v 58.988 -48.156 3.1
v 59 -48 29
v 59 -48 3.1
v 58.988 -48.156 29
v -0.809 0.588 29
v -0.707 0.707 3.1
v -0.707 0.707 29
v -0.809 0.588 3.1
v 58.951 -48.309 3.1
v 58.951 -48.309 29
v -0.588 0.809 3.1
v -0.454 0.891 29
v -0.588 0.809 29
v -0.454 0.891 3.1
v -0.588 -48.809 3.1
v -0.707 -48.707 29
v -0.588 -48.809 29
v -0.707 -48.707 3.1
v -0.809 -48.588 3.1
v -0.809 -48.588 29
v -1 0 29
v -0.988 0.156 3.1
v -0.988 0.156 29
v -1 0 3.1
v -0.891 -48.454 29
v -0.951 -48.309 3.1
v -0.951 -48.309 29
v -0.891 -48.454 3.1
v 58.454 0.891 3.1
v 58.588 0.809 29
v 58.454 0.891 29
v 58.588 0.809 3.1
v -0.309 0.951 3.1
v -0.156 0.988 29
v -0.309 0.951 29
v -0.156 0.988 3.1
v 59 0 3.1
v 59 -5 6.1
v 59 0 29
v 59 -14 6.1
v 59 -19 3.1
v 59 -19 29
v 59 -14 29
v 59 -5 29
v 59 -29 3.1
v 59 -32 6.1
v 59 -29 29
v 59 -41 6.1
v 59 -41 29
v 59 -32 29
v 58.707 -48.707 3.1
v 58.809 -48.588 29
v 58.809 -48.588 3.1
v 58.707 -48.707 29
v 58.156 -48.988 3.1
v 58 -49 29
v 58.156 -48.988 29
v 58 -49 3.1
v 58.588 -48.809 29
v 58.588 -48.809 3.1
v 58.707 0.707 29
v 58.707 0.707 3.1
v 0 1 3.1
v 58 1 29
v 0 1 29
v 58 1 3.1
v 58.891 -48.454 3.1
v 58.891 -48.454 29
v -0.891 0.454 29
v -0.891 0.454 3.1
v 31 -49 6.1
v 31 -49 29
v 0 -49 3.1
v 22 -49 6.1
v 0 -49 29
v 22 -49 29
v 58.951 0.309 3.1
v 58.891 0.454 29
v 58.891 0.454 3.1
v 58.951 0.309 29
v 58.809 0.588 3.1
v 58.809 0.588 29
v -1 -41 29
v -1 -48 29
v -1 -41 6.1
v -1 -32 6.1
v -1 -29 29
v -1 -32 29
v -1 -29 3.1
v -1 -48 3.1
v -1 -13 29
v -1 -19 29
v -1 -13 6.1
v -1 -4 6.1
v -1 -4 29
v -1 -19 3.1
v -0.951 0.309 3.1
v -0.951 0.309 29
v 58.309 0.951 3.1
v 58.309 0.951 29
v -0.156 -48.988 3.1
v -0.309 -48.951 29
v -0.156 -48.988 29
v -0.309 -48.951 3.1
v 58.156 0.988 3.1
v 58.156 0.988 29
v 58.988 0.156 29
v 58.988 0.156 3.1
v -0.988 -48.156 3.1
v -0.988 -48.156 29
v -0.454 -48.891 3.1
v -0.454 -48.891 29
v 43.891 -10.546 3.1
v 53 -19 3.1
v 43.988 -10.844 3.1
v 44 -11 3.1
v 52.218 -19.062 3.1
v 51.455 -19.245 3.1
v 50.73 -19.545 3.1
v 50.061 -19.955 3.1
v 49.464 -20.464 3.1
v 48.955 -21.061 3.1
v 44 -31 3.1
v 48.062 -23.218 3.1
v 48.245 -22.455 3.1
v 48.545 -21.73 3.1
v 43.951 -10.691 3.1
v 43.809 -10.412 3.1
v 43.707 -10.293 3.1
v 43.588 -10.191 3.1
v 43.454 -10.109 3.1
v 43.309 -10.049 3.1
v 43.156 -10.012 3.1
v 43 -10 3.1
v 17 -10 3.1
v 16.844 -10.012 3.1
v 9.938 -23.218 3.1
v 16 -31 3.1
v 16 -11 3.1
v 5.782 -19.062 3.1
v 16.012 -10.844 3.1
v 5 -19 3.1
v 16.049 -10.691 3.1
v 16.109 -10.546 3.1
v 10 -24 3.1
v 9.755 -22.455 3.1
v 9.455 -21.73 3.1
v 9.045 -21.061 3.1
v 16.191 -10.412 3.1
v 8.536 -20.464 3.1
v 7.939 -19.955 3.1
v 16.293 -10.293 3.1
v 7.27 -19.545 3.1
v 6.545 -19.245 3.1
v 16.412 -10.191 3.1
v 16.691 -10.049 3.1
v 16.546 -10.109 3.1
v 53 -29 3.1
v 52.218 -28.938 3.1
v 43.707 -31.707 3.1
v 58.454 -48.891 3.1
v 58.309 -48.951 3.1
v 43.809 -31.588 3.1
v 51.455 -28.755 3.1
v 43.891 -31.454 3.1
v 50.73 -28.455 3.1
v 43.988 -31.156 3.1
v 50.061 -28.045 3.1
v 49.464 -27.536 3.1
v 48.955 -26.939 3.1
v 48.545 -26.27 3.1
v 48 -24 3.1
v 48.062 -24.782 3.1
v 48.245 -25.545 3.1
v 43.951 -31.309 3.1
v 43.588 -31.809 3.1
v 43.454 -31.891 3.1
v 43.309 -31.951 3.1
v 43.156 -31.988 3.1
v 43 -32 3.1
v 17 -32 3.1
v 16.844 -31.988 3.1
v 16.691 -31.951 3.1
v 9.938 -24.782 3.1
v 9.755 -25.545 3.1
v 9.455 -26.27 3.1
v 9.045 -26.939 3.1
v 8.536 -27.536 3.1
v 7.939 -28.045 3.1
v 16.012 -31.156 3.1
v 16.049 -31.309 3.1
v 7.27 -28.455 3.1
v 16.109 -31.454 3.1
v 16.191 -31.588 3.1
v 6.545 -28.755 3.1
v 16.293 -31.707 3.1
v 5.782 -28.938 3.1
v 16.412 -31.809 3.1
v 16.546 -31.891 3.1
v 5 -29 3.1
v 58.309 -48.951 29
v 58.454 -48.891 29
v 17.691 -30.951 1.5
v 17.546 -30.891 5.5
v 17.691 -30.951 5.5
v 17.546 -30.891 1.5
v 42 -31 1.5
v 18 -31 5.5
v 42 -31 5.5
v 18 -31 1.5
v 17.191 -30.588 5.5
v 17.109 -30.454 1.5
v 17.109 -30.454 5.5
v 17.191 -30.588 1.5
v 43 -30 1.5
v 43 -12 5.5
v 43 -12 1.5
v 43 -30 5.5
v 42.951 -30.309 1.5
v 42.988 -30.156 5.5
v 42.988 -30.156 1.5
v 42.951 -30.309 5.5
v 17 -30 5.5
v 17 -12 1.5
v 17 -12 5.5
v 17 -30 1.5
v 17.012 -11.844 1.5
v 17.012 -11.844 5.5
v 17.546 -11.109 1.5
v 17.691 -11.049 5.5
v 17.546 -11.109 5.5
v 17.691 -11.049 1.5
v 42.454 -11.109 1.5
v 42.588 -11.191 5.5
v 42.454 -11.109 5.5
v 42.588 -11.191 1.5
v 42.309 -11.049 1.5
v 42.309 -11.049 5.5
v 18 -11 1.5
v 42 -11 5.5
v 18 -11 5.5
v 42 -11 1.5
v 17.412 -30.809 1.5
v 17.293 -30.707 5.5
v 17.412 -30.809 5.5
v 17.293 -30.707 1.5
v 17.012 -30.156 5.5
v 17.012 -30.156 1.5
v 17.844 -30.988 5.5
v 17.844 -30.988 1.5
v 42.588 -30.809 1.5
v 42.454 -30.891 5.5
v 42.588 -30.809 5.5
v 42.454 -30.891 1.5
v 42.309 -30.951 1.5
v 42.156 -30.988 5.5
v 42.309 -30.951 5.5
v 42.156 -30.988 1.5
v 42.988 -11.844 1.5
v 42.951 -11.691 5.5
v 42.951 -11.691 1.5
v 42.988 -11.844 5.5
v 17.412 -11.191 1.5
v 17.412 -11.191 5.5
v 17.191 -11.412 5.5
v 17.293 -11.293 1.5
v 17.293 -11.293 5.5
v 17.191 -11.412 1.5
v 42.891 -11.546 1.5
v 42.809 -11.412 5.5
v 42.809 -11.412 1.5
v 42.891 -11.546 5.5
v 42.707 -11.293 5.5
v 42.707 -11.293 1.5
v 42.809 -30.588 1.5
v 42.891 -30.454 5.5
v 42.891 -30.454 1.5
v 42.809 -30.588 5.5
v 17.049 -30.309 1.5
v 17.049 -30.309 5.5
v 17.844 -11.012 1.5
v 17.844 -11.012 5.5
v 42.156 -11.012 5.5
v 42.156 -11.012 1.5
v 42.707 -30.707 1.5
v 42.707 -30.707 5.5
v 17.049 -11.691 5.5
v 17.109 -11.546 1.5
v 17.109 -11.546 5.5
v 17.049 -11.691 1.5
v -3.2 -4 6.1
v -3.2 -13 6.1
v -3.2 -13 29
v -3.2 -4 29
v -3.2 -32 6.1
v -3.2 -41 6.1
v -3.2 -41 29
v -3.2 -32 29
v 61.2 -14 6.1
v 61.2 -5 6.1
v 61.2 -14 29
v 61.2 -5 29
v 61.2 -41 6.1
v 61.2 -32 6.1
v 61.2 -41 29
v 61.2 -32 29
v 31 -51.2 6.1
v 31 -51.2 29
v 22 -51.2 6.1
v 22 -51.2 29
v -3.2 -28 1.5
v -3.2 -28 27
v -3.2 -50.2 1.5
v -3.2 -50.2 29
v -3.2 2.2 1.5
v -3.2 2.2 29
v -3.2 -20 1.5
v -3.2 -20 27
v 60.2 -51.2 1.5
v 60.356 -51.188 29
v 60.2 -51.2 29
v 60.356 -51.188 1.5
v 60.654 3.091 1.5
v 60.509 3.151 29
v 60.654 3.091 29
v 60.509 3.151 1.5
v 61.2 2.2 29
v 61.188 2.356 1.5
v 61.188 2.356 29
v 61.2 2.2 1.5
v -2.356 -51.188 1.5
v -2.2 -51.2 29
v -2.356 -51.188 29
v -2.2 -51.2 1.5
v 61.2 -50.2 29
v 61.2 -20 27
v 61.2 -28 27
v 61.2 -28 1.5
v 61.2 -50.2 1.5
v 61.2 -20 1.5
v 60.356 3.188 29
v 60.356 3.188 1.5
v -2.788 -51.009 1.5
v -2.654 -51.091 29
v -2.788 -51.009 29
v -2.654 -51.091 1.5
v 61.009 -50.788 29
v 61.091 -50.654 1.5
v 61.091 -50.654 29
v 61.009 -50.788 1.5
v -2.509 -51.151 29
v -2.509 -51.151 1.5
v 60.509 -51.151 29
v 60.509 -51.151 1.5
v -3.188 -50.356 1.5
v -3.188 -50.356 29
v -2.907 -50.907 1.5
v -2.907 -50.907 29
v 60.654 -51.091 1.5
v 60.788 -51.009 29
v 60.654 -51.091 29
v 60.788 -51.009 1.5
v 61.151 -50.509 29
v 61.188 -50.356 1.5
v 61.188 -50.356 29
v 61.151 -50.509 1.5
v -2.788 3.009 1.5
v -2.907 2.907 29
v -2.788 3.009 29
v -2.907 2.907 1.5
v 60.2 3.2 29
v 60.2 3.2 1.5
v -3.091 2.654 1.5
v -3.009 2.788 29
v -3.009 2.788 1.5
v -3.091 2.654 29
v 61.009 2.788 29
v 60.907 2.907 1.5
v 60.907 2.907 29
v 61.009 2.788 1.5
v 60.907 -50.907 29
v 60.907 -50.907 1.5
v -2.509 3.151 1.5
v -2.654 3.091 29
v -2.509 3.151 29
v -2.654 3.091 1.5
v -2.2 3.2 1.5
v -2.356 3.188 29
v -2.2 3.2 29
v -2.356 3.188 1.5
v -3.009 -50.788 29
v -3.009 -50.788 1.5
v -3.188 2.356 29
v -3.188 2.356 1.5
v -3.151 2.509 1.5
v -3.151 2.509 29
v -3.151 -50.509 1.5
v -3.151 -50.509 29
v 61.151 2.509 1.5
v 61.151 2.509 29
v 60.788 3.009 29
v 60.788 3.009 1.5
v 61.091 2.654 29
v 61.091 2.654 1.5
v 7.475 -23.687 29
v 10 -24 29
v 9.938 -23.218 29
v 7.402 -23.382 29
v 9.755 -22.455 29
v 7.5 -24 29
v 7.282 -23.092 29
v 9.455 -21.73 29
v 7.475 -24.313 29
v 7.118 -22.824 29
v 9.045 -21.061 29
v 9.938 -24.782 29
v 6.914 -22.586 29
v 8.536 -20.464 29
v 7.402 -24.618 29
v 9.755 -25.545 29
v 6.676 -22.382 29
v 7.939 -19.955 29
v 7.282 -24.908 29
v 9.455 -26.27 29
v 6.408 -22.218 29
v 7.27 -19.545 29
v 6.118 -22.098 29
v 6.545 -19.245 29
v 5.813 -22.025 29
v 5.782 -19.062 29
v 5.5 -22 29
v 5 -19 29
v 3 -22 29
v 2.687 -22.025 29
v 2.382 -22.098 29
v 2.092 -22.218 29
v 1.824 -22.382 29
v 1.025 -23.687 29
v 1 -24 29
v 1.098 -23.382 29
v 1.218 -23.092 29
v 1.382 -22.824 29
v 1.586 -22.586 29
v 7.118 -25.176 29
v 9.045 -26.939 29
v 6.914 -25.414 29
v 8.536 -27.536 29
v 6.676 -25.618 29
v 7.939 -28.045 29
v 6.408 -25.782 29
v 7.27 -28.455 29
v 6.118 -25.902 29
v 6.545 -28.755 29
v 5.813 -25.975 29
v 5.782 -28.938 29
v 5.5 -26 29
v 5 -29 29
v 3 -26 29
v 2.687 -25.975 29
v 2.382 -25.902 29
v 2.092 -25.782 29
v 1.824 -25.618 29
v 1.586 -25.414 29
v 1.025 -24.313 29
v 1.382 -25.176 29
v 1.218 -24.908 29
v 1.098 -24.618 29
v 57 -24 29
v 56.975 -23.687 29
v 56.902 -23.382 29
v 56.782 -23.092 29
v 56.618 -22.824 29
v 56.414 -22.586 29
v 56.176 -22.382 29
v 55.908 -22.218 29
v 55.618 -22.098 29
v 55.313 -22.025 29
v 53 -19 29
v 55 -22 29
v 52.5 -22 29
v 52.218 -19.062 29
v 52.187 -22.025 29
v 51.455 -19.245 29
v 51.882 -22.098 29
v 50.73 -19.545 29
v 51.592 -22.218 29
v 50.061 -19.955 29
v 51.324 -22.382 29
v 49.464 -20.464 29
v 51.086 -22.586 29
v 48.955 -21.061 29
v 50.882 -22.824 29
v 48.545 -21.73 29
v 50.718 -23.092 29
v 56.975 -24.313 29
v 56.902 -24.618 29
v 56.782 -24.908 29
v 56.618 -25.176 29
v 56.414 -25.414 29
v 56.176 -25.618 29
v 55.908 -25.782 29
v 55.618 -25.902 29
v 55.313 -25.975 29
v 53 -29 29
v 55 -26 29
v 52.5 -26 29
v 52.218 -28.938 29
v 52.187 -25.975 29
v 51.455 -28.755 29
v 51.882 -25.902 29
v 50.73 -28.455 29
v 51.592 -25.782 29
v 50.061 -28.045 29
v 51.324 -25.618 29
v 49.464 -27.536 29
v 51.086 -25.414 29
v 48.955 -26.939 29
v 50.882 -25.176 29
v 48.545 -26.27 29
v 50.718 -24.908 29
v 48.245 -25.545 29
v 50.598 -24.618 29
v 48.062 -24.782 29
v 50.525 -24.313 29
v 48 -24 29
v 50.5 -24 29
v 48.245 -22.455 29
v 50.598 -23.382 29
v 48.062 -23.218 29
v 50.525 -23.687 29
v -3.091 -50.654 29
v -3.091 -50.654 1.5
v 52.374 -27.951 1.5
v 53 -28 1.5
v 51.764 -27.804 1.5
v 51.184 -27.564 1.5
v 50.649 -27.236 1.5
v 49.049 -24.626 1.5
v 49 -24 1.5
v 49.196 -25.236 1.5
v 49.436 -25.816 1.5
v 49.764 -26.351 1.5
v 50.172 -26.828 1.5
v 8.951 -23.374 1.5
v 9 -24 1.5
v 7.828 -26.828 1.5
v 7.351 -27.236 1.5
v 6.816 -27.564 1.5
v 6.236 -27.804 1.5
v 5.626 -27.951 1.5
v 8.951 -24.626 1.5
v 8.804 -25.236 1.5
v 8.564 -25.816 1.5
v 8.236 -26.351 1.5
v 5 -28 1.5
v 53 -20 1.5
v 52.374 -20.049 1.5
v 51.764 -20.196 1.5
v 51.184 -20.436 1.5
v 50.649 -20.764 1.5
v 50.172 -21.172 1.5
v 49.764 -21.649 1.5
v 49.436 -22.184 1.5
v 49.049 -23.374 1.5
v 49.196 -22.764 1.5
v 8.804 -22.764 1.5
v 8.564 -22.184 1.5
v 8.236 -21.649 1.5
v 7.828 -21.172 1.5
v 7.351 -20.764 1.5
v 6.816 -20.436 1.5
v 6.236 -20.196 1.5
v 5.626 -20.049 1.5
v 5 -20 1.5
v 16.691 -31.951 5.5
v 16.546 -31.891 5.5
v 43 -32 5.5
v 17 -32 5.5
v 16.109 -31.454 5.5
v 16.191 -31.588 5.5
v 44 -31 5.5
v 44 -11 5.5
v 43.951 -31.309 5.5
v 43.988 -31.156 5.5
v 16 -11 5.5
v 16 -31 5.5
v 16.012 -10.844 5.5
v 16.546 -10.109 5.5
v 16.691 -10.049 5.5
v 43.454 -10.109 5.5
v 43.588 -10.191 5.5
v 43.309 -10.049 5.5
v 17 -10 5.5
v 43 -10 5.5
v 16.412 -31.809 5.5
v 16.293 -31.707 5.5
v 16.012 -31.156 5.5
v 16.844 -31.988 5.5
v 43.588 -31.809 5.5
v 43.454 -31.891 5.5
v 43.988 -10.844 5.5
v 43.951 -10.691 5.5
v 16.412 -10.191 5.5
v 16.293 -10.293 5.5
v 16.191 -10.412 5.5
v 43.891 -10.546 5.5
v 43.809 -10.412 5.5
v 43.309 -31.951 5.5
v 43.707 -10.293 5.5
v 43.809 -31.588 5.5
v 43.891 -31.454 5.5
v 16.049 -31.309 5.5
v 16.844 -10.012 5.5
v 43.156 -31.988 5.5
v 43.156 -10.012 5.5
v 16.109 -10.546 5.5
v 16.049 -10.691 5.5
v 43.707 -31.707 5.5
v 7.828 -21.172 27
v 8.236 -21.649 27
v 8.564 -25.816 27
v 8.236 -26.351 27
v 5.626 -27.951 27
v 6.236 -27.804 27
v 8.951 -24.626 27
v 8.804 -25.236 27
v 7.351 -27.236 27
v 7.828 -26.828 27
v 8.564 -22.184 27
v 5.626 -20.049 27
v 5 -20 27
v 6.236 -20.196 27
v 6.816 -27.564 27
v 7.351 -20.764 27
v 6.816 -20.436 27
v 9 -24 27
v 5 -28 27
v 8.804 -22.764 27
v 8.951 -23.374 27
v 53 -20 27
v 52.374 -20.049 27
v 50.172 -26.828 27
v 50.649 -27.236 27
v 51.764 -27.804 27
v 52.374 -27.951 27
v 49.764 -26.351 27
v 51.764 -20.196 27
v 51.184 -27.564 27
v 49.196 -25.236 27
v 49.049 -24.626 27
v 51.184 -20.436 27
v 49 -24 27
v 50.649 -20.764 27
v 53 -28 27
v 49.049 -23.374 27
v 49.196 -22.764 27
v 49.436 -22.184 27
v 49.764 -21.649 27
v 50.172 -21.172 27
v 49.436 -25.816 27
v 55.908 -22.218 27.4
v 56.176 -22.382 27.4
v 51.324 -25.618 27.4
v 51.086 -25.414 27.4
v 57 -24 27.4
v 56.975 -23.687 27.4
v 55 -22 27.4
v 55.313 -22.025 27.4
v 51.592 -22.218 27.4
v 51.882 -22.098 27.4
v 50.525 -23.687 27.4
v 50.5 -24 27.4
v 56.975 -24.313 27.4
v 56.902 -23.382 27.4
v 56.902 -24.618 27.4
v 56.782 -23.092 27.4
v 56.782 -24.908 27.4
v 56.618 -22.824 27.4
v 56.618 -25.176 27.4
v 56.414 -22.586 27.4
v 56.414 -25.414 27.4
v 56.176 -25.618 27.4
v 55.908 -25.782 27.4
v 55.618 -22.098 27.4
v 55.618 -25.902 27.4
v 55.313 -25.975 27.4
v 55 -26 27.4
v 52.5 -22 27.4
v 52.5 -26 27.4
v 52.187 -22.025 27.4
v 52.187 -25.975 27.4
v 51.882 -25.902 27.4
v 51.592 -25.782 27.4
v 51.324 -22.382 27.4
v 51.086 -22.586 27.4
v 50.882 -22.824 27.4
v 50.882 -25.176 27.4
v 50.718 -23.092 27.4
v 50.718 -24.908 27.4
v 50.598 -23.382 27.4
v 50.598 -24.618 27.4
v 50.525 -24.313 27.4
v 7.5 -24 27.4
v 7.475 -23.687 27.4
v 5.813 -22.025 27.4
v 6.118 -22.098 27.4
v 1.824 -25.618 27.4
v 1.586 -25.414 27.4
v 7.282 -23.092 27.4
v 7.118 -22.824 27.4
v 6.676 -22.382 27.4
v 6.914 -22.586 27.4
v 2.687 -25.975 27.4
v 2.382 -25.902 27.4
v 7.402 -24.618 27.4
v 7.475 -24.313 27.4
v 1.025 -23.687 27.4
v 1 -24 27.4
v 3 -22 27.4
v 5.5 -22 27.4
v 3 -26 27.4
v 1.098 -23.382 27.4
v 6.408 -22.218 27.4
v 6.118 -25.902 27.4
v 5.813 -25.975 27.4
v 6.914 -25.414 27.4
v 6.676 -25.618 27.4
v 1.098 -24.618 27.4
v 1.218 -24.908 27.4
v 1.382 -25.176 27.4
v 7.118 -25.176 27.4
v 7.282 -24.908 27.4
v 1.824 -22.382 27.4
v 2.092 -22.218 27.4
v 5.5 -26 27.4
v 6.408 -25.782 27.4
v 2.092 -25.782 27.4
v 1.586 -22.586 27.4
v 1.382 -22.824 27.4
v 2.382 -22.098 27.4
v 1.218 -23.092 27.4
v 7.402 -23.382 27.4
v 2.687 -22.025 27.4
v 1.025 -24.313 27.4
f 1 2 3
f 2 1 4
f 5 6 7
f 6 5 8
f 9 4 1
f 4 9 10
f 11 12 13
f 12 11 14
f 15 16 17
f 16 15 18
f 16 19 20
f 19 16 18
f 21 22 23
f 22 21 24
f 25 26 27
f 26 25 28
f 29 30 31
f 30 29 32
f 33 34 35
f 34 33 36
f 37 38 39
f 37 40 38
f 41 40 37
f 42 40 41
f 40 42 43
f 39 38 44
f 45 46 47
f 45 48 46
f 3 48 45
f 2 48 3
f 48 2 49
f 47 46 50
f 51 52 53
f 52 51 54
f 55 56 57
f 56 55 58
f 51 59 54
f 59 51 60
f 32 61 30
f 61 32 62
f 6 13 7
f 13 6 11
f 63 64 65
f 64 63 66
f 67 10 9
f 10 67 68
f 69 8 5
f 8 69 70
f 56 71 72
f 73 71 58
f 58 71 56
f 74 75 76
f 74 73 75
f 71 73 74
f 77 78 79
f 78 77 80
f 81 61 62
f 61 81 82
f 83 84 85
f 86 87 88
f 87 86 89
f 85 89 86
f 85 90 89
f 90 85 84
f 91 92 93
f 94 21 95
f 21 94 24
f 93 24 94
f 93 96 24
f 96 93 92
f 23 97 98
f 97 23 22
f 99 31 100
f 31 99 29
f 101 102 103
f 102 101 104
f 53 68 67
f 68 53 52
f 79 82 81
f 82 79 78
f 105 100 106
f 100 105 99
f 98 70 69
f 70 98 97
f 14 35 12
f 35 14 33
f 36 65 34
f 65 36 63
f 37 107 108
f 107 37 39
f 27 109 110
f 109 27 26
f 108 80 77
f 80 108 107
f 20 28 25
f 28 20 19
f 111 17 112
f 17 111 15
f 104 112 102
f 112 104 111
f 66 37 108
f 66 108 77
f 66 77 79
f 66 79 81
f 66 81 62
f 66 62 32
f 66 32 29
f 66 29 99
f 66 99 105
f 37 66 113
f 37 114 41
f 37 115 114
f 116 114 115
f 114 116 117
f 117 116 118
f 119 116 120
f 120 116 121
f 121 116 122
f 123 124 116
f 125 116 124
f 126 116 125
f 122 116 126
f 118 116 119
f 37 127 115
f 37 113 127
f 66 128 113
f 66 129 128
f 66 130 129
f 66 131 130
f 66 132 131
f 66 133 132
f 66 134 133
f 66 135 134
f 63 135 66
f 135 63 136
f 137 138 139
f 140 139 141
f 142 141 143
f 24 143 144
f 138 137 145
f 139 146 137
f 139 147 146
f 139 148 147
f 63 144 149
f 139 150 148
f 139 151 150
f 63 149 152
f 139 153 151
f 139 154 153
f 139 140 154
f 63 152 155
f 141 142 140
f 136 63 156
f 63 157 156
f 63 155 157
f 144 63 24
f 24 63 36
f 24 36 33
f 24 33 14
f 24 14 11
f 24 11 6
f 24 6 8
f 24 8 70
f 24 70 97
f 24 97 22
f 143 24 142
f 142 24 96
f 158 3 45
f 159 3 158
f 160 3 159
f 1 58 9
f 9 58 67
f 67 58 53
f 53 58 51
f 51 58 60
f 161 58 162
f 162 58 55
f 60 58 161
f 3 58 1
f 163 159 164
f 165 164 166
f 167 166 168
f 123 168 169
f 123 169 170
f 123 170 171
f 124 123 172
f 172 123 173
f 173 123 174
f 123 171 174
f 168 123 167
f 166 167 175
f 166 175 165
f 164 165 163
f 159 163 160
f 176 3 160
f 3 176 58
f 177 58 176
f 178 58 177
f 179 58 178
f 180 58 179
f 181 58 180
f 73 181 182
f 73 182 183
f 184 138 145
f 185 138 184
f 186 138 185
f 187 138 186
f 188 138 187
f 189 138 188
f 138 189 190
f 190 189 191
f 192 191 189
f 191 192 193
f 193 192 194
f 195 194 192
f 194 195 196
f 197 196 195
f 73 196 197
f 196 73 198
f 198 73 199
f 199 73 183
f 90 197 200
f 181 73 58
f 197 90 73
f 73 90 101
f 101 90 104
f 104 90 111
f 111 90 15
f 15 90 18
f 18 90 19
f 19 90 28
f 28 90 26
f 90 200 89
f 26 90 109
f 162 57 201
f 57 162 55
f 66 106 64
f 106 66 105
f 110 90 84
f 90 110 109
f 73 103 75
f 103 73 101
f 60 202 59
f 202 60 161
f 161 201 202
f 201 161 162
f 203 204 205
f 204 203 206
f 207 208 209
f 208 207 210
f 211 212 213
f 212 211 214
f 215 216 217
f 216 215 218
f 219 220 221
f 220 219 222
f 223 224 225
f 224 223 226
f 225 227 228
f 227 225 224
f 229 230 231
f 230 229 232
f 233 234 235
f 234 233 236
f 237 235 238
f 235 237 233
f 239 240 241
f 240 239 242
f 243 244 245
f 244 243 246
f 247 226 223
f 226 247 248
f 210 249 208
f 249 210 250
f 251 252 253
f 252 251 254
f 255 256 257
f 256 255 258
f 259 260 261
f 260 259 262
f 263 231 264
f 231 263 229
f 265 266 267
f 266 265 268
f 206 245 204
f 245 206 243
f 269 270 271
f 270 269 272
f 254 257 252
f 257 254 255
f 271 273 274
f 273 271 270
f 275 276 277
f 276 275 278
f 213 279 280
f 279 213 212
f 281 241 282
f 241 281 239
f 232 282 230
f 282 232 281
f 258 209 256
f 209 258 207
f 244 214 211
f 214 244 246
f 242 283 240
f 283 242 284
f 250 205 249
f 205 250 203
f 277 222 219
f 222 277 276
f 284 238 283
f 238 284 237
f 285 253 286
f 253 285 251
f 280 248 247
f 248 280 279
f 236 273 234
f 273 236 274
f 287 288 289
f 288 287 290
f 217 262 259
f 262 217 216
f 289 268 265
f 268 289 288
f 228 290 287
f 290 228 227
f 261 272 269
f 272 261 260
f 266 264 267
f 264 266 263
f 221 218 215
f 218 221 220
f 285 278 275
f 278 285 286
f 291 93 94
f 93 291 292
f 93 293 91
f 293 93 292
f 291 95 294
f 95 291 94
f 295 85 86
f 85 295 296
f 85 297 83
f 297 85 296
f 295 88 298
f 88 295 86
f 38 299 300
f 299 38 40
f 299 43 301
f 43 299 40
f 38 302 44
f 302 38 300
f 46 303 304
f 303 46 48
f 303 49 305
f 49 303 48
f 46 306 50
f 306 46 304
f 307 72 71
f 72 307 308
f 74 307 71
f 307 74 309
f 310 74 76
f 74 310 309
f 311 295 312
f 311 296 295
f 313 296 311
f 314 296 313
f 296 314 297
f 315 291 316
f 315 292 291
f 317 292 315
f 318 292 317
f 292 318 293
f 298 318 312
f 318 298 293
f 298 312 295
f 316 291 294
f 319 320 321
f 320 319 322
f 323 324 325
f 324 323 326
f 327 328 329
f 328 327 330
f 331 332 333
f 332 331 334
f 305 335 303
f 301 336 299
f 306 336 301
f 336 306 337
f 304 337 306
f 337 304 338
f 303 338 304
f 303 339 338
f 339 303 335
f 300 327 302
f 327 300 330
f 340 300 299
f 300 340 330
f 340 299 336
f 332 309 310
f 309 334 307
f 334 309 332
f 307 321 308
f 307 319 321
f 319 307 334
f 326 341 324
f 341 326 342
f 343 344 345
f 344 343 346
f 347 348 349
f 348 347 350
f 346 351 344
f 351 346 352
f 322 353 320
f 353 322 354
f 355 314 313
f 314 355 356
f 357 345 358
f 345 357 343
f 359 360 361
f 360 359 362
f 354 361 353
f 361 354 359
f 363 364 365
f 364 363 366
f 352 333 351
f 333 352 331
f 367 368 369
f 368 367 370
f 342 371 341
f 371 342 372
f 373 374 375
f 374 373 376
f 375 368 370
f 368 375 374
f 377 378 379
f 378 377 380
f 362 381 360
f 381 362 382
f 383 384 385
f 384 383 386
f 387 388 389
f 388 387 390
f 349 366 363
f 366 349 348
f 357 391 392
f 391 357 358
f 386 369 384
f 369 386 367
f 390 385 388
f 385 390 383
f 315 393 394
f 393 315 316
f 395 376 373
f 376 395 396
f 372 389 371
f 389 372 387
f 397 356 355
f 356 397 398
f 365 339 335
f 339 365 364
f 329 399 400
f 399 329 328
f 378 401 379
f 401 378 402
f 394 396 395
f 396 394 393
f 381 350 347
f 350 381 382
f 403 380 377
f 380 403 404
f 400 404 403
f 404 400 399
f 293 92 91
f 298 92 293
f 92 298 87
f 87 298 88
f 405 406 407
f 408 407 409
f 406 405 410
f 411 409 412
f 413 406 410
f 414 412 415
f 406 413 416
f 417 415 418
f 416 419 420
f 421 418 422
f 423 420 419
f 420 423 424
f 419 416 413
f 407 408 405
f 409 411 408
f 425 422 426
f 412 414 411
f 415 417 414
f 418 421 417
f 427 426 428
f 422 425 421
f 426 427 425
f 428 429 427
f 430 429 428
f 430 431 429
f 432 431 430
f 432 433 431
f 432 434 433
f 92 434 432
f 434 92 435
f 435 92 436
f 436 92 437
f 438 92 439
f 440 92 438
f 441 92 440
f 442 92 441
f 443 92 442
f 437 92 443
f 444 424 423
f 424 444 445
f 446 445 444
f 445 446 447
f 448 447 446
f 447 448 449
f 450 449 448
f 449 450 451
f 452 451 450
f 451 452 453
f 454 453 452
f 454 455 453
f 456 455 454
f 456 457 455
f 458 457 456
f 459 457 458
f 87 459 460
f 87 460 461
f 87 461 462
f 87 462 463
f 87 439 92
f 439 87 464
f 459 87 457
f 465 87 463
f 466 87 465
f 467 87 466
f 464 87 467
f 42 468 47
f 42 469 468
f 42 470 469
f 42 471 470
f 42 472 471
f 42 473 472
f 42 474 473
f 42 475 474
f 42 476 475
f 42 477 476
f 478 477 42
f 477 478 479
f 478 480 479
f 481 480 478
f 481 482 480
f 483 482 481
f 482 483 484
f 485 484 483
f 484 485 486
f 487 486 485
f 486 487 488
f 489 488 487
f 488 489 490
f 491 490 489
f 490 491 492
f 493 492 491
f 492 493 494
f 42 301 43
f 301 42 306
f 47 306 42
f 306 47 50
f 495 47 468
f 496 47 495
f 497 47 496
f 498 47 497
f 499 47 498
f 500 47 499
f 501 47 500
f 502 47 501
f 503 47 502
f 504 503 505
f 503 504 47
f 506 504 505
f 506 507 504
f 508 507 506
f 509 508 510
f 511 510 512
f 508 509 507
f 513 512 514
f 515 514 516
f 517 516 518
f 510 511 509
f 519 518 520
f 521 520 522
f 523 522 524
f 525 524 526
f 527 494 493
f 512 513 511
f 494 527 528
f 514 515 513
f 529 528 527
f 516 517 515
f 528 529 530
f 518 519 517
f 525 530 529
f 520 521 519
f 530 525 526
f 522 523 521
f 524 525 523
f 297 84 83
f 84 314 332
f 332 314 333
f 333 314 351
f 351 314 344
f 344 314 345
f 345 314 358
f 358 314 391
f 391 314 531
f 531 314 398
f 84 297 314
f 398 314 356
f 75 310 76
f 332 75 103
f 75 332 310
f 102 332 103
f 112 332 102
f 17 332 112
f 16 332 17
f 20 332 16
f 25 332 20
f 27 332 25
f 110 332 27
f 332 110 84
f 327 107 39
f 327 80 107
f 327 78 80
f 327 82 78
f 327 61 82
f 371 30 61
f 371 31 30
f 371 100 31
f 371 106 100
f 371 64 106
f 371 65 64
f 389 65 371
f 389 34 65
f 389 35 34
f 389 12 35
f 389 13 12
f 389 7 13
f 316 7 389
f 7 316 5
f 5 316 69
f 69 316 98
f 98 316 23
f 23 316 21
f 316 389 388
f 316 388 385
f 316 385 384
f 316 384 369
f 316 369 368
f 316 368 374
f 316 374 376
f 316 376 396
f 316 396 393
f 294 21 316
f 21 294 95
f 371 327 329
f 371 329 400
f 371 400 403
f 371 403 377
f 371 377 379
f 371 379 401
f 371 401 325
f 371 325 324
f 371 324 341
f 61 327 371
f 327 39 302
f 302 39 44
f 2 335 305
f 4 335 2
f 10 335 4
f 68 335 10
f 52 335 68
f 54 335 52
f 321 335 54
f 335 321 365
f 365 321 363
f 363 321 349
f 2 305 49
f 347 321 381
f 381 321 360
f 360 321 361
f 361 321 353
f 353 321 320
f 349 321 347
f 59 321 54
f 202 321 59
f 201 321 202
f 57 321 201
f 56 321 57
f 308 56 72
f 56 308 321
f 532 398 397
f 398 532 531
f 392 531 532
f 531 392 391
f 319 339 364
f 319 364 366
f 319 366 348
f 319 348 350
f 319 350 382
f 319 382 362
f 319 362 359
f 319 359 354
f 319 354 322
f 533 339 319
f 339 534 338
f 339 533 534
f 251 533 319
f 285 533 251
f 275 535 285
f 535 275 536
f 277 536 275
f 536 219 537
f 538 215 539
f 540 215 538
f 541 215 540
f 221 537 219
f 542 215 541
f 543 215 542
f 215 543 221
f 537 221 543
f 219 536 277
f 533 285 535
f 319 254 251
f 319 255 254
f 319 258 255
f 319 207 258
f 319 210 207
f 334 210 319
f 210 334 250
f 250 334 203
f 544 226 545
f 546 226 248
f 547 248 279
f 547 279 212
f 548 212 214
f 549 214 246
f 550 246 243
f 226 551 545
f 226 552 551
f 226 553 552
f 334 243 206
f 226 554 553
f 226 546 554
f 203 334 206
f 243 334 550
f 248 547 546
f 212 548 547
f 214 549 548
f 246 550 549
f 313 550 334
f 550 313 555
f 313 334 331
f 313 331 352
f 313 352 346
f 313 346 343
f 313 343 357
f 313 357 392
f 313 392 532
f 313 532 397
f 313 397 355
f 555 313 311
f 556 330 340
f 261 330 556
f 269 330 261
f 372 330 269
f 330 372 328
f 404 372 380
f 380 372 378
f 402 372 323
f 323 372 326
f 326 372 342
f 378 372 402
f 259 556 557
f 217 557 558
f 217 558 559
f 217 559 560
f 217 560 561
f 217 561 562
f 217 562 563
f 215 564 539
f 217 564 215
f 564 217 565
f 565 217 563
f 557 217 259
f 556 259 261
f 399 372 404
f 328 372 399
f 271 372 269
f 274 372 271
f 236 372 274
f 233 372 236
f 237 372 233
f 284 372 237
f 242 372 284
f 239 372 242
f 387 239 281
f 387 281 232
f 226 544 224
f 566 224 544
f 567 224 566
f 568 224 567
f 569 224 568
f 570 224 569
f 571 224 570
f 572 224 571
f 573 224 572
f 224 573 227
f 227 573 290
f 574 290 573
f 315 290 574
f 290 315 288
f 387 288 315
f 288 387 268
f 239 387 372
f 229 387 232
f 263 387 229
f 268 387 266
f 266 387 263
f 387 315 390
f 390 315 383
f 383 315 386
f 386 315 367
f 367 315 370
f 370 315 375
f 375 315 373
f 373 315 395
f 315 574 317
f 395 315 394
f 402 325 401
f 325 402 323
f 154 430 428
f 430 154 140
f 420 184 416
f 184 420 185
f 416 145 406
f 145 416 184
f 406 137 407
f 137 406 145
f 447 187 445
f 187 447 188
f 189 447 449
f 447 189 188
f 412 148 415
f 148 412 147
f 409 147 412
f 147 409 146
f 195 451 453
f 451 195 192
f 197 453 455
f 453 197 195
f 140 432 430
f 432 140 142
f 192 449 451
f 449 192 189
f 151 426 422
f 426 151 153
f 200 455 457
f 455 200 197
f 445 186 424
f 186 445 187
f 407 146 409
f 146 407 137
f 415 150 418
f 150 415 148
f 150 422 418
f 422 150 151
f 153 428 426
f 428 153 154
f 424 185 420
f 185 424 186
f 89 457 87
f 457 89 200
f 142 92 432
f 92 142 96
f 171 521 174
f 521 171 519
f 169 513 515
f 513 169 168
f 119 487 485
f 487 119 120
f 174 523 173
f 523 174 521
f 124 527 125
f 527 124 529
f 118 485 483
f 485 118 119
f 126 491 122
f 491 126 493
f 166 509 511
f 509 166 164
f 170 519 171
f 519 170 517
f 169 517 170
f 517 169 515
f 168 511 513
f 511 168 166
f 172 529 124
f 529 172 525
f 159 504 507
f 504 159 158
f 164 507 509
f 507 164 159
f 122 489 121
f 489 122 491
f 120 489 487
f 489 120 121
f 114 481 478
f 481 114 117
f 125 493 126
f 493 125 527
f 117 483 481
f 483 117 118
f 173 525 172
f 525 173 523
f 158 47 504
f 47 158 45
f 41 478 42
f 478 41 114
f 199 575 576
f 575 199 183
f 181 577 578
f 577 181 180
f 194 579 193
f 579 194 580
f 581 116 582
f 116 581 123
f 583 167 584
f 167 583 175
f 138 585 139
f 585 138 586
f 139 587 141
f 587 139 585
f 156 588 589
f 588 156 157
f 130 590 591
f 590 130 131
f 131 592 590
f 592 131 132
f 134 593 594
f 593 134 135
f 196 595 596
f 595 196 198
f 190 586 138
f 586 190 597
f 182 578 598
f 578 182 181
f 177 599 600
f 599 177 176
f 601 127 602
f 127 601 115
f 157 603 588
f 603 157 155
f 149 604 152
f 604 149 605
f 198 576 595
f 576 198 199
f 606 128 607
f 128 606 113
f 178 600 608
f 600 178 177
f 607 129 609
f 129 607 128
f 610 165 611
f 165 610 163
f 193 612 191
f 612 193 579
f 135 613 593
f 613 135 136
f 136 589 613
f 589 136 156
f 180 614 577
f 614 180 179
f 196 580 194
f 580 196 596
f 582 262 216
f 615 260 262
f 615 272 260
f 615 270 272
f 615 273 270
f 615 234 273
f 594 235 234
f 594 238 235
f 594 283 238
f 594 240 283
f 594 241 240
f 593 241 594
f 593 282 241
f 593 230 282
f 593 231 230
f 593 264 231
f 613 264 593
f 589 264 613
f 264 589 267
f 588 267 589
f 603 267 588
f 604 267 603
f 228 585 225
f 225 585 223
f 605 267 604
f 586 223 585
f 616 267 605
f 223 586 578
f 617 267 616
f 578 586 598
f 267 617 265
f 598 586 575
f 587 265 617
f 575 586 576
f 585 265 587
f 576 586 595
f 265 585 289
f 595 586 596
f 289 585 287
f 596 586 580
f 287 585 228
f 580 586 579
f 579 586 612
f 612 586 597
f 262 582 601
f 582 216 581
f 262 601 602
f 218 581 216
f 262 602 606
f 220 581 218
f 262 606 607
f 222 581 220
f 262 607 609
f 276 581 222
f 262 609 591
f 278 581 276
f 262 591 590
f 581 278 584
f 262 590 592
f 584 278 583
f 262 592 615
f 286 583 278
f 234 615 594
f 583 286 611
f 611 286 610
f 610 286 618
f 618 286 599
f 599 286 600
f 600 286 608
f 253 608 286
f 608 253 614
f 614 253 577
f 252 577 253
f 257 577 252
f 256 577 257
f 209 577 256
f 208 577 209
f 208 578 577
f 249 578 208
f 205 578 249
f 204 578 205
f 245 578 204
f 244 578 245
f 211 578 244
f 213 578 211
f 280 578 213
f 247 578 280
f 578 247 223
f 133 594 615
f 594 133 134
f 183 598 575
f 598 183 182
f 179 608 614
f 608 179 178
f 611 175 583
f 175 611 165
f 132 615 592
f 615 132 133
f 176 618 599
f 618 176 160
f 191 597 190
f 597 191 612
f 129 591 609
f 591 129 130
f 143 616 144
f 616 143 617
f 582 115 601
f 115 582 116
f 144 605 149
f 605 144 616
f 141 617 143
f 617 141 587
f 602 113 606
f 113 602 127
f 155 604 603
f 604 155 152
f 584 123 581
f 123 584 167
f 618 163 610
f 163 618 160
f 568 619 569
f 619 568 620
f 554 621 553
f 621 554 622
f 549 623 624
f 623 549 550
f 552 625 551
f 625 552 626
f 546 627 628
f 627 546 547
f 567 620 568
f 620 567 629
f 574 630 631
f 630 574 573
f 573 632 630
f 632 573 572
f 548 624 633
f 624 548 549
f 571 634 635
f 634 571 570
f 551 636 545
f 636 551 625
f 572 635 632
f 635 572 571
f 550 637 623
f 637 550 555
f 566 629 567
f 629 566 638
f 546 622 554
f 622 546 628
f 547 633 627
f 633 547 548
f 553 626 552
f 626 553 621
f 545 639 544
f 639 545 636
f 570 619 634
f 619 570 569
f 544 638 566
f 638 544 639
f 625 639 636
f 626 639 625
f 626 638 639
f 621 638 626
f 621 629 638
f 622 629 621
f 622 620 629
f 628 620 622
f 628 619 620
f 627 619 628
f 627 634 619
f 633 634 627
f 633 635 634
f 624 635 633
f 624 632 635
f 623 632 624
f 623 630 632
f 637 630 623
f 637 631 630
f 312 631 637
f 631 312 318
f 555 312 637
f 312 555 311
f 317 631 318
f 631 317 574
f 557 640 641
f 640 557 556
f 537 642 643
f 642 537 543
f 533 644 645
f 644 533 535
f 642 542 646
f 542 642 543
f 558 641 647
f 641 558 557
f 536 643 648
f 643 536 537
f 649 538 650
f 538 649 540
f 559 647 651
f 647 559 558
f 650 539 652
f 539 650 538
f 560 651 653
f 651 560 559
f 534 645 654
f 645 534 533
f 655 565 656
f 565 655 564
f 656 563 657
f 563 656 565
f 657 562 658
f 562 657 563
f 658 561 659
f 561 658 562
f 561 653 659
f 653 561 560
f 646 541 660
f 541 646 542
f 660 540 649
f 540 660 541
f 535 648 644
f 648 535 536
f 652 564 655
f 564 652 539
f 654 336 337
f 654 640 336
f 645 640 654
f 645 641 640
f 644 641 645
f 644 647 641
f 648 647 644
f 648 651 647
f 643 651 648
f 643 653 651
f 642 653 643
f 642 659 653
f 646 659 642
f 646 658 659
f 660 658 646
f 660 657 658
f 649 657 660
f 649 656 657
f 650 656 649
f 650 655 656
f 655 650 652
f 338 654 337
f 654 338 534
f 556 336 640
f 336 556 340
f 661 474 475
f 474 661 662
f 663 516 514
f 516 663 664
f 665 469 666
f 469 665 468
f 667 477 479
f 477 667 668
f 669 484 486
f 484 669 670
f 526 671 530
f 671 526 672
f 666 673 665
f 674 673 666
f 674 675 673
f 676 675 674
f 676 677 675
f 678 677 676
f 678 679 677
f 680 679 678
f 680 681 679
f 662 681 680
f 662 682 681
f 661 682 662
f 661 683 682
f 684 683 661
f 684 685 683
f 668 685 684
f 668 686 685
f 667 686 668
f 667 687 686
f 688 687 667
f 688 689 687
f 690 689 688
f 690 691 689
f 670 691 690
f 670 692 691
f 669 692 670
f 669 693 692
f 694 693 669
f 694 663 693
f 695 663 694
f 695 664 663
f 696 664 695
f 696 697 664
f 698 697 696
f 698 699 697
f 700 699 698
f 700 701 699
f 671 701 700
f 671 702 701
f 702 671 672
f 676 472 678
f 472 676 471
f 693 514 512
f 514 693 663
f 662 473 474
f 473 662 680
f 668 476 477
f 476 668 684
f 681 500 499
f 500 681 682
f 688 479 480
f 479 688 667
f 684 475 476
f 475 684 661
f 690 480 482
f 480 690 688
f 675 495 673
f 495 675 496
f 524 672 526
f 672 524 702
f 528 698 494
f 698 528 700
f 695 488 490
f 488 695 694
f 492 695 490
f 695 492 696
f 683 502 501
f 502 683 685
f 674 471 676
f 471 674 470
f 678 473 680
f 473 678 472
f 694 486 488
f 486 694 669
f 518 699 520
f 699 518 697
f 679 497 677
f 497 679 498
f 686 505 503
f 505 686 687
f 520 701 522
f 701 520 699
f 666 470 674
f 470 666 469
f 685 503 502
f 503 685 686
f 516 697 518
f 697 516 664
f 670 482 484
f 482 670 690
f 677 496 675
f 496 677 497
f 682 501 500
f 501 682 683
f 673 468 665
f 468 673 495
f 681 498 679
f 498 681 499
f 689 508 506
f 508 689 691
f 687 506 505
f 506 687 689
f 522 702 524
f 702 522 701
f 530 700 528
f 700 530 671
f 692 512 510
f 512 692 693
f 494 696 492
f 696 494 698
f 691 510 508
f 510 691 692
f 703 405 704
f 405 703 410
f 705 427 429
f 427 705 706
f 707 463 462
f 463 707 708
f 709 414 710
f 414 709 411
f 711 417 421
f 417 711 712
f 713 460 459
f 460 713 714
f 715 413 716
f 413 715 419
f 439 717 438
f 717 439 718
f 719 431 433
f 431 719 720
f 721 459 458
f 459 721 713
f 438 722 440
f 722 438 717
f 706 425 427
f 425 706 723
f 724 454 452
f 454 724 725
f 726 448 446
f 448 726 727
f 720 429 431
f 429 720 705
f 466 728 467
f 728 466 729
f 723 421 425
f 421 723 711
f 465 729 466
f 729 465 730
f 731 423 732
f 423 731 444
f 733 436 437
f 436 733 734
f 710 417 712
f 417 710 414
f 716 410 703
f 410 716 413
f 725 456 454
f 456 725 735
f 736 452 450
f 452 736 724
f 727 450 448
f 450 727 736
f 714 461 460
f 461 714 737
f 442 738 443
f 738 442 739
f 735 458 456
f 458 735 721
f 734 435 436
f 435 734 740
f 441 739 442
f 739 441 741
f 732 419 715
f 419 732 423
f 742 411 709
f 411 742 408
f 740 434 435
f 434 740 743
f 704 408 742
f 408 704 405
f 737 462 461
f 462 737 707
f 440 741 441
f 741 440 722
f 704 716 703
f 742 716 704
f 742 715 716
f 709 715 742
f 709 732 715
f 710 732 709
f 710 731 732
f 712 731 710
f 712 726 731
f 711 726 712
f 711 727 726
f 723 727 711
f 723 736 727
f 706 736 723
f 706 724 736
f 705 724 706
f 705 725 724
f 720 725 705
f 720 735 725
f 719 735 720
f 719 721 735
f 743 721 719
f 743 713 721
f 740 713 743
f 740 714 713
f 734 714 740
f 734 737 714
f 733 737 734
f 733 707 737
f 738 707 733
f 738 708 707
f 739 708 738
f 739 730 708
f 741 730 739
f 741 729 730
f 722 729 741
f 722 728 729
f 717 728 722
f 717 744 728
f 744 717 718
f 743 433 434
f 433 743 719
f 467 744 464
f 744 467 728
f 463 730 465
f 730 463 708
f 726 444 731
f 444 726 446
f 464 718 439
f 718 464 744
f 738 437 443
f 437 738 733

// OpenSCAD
$fn=40;

 translate([0,0,29]) rotate([180,0,0]) cover();

module cover() {
   difference() {
      union() {
         difference() {
            outside();
            translate([0,0,-0.1]) inside();
         }
         mounts();

         // add back in a little edge around the inside opening
         if (1) difference() {
            hull() {
               translate([17,11,23.5]) cylinder(r=1,h=4);
               translate([17,31,23.5]) cylinder(r=1,h=4);
               translate([43,11,23.5]) cylinder(r=1,h=4);
               translate([43,31,23.5]) cylinder(r=1,h=4);
            }
            hull() {
               translate([18,12,0]) cylinder(r=1,h=40);
               translate([18,30,0]) cylinder(r=1,h=40);
               translate([42,12,0]) cylinder(r=1,h=40);
               translate([42,30,0]) cylinder(r=1,h=40);
            }
         }
      }
      moreCutouts();
   }
}

module moreCutouts() {
   translate([5,48/2,2]) cylinder(d=8,h=33);
   translate([-3.2,48/2-5+1,2]) cube([8.2,8,33]);
   translate([58-5,48/2,2]) cylinder(d=8,h=33);
   translate([58-5,48/2-5+1,2]) cube([8.2,8,33]);

   hull() {
      translate([58-5.5,48/2,-0.1]) cylinder(d=4,h=1.7);
      translate([58-3,48/2,-0.1]) cylinder(d=4,h=1.7);
   }
   hull() {
      translate([5.5,48/2,-0.1]) cylinder(d=4,h=1.7);
      translate([3,48/2,-0.1]) cylinder(d=4,h=1.7);
   }
}

// these are the bits on the ends for screws
module mounts(ht=27.5) {
   difference() {
      union() {
         translate([5,48/2,0]) cylinder(d=10,h=ht);
         translate([-2,48/2-5,0]) cube([7,10,ht]);
         translate([58-5,48/2,0]) cylinder(d=10,h=ht);
         translate([58-5,48/2-5,0]) cube([7,10,ht]);
      }
   }
}

// rough outside form
module outside(ht=27.5) {
   translate([-2.2,-2.2,0]) hull() {
      cylinder(r=1,h=ht);
      translate([62.4,52.4,0]) cylinder(r=1,h=ht);
      translate([0,52.4,0]) cylinder(r=1,h=ht);
      translate([62.4,0,0]) cylinder(r=1,h=ht);
   }
}

// rough inside form, with openings for wiring
module inside(ht=26) {
   hull() {
      cylinder(r=1,h=ht);
      translate([58,48,0]) cylinder(r=1,h=ht);
      translate([0,48,0]) cylinder(r=1,h=ht);
      translate([58,0,0]) cylinder(r=1,h=ht);
   }

   hull() {
      translate([18,12,0]) cylinder(r=1,h=40);
      translate([18,30,0]) cylinder(r=1,h=40);
      translate([42,12,0]) cylinder(r=1,h=40);
      translate([42,30,0]) cylinder(r=1,h=40);
   }

   // openings for wiring
   translate([-4,4,-1.5]) cube([10,9,ht-1.5]);
   translate([-4,32,-1.5]) cube([10,9,ht-1.5]);
   translate([55,5,-1.5]) cube([10,9,ht-1.5]);
   translate([55,32,-1.5]) cube([10,9,ht-1.5]);
   translate([22,45,-1.5]) cube([9,10,ht-1.5]);
}
